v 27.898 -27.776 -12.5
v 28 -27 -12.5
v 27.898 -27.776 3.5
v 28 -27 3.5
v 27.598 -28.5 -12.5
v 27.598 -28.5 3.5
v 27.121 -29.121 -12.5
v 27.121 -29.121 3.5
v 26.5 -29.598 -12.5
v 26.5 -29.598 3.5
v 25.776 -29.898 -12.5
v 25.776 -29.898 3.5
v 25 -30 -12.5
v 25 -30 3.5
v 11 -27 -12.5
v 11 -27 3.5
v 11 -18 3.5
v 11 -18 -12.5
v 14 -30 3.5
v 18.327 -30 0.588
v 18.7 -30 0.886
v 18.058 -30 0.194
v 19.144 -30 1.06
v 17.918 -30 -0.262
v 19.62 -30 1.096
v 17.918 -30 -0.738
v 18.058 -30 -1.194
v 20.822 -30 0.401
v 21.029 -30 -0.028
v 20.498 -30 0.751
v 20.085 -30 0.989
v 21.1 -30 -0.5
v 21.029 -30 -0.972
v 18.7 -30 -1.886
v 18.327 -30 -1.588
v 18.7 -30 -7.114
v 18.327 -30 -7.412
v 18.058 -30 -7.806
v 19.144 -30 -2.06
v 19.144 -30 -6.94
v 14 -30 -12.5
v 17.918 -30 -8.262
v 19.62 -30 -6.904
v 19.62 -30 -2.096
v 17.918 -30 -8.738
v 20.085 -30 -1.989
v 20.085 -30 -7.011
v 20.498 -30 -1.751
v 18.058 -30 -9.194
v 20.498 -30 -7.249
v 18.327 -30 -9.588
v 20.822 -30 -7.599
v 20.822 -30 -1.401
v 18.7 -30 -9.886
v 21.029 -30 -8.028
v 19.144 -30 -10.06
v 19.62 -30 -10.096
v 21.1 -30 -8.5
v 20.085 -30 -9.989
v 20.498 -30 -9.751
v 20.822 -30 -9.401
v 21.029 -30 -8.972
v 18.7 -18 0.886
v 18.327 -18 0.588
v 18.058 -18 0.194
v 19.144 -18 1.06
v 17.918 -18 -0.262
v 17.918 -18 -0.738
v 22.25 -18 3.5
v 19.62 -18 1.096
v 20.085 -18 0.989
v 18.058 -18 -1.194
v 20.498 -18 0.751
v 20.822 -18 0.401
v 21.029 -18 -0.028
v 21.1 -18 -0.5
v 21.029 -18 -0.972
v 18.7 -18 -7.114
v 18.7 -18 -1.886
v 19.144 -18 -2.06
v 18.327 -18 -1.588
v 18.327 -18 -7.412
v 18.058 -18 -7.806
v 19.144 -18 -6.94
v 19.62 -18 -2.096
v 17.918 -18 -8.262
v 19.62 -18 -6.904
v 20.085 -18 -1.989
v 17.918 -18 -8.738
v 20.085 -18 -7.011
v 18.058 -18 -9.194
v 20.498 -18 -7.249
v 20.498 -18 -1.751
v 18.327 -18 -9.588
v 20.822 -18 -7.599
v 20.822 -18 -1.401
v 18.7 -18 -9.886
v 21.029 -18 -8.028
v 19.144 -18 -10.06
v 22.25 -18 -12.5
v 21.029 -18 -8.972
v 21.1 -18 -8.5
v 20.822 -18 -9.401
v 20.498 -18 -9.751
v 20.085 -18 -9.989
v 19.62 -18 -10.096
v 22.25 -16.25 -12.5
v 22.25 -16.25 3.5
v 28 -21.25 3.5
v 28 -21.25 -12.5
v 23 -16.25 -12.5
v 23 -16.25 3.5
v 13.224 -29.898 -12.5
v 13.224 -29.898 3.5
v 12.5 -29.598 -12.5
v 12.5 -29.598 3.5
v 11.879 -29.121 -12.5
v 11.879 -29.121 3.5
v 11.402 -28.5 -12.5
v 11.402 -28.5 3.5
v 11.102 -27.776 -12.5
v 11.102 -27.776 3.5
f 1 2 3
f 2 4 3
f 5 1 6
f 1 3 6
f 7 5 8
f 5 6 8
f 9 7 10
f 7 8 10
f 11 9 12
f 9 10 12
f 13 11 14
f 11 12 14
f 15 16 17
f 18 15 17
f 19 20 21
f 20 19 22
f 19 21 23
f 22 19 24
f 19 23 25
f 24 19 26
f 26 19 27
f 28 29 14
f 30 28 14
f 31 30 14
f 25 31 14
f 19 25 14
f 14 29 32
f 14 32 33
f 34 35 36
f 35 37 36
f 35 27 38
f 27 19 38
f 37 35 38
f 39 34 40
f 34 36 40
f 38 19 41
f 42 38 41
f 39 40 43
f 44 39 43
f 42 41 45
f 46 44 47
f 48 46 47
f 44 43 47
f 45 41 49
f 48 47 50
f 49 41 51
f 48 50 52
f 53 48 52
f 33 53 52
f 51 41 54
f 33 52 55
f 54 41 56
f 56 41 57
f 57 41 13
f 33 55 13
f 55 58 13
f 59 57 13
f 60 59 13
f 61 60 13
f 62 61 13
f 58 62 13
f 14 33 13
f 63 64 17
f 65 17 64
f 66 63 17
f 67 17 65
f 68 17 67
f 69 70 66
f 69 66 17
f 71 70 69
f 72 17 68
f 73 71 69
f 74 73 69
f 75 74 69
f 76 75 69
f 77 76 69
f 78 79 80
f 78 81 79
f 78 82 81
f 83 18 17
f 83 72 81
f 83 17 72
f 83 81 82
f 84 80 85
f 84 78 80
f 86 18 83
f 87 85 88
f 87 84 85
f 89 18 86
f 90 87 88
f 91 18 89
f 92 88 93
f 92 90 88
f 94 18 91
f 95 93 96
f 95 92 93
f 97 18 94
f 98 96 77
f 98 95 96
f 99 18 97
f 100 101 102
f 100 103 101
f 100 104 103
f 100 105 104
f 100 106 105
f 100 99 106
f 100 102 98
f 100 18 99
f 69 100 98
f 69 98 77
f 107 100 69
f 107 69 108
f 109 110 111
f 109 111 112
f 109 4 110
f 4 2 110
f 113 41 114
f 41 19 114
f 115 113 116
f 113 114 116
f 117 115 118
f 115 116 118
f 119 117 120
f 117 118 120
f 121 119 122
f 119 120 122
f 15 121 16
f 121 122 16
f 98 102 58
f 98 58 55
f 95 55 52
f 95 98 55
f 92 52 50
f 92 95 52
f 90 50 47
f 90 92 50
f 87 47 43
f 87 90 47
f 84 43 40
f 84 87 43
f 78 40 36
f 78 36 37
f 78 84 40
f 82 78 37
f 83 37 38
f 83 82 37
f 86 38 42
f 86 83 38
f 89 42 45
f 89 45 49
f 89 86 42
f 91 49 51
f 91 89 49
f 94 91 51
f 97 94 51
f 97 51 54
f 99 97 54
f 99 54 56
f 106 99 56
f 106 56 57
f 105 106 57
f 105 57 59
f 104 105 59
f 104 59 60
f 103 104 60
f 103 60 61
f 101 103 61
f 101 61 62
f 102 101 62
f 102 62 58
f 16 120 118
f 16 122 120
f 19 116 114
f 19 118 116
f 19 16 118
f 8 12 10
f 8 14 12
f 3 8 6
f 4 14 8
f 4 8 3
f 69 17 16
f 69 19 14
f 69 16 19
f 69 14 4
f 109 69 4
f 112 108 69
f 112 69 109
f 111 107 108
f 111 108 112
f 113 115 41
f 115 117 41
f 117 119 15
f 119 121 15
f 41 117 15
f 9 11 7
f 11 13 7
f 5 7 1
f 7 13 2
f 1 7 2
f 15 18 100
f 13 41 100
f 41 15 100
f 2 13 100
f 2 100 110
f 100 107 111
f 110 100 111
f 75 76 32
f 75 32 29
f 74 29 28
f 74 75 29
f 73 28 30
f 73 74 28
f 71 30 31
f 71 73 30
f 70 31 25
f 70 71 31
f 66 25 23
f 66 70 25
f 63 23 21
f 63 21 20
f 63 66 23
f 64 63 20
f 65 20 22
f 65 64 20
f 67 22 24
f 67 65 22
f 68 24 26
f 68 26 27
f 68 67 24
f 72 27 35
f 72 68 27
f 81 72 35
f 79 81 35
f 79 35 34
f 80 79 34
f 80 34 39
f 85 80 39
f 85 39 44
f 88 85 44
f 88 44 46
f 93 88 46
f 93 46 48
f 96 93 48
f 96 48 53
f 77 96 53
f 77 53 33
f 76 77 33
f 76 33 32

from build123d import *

# Parameters (mm, degrees)
CYLINDER898_R          = 1.6
CYLINDER898_DEPTH      = 20
CYLINDER898_ROLL_ANGLE = 90
CYLINDER897_R          = 1.6
CYLINDER897_DEPTH      = 20
CYLINDER897_ROLL_ANGLE = 90
BOX552_W               = 17
BOX552_H               = 12
BOX552_DEPTH           = 16
BOX553_W               = 5.75
BOX553_H               = 1.75
BOX553_DEPTH           = 16
CHAMFER001_SIZE        = 5
FILLET013_R            = 3


with BuildPart() as cylinder1021:
    # Cylinder898 → Cylinder898 (new body)
    with BuildSketch(Plane.XY):
        Circle(CYLINDER898_R)
    extrude(amount=CYLINDER898_DEPTH)


with BuildPart() as cylinder1021_1:
    # Cylinder898 roll: moved
    add(cylinder1021.part.rotate(Axis((0, 0, 0), (1, 0, 0)), CYLINDER898_ROLL_ANGLE))


with BuildPart() as cylinder1021_2:
    # Cylinder898 placement: moved
    add(cylinder1021_1.part.moved(Location((19.5, 30, 0.5))))


with BuildPart() as fusion056:
    # Cylinder897 → Cylinder897 (new body)
    with BuildSketch(Plane.XY):
        Circle(CYLINDER897_R)
    extrude(amount=CYLINDER897_DEPTH)


with BuildPart() as fusion056_1:
    # Cylinder897 roll: moved
    add(fusion056.part.rotate(Axis((0, 0, 0), (1, 0, 0)), CYLINDER897_ROLL_ANGLE))


with BuildPart() as fusion056_2:
    # Cylinder897 placement: moved
    add(fusion056_1.part.moved(Location((19.5, 30, -7.5))))

    # Fusion056: union Cylinder1021
    add(cylinder1021_2.part)


with BuildPart() as fusion056_3:
    # Fusion056 placement: moved
    add(fusion056_2.part.moved(Location((0, -40, 0))))


with BuildPart() as cube743:
    # Box552 → Box552 (new body)
    with BuildSketch(Plane(origin=(11, -30, -11.5), x_dir=(1, 0, 0), z_dir=(0, 0, 1))):
        with Locations((8.5, 6)):
            Rectangle(BOX552_W, BOX552_H)
    extrude(amount=BOX552_DEPTH)


with BuildPart() as diff_box_mount_left:
    # Box553 → Box553 (new body)
    with BuildSketch(Plane(origin=(22.25, -18, -11.5), x_dir=(1, 0, 0), z_dir=(0, 0, 1))):
        with Locations((2.875, 0.875)):
            Rectangle(BOX553_W, BOX553_H)
    extrude(amount=BOX553_DEPTH)

    # Fusion055: union Cube743
    add(cube743.part)

    # Chamfer001
    chamfer001_edges = [diff_box_mount_left.edges().sort_by_distance(p)[0] for p in [
        (28, -16.25, -3.5),
    ]]
    chamfer(chamfer001_edges, length=CHAMFER001_SIZE)

    # Fillet013
    fillet013_edges = [diff_box_mount_left.edges().sort_by_distance(p)[0] for p in [
        (28, -30, -3.5),
        (11, -30, -3.5),
    ]]
    fillet(fillet013_edges, radius=FILLET013_R)

    # Cut014020: cut Fusion056
    add(fusion056_3.part, mode=Mode.SUBTRACT)


with BuildPart() as diff_box_mount_left_1:
    # Cut014020 placement: moved
    add(diff_box_mount_left.part.moved(Location((0, 0, -1))))


solid = diff_box_mount_left_1.part
